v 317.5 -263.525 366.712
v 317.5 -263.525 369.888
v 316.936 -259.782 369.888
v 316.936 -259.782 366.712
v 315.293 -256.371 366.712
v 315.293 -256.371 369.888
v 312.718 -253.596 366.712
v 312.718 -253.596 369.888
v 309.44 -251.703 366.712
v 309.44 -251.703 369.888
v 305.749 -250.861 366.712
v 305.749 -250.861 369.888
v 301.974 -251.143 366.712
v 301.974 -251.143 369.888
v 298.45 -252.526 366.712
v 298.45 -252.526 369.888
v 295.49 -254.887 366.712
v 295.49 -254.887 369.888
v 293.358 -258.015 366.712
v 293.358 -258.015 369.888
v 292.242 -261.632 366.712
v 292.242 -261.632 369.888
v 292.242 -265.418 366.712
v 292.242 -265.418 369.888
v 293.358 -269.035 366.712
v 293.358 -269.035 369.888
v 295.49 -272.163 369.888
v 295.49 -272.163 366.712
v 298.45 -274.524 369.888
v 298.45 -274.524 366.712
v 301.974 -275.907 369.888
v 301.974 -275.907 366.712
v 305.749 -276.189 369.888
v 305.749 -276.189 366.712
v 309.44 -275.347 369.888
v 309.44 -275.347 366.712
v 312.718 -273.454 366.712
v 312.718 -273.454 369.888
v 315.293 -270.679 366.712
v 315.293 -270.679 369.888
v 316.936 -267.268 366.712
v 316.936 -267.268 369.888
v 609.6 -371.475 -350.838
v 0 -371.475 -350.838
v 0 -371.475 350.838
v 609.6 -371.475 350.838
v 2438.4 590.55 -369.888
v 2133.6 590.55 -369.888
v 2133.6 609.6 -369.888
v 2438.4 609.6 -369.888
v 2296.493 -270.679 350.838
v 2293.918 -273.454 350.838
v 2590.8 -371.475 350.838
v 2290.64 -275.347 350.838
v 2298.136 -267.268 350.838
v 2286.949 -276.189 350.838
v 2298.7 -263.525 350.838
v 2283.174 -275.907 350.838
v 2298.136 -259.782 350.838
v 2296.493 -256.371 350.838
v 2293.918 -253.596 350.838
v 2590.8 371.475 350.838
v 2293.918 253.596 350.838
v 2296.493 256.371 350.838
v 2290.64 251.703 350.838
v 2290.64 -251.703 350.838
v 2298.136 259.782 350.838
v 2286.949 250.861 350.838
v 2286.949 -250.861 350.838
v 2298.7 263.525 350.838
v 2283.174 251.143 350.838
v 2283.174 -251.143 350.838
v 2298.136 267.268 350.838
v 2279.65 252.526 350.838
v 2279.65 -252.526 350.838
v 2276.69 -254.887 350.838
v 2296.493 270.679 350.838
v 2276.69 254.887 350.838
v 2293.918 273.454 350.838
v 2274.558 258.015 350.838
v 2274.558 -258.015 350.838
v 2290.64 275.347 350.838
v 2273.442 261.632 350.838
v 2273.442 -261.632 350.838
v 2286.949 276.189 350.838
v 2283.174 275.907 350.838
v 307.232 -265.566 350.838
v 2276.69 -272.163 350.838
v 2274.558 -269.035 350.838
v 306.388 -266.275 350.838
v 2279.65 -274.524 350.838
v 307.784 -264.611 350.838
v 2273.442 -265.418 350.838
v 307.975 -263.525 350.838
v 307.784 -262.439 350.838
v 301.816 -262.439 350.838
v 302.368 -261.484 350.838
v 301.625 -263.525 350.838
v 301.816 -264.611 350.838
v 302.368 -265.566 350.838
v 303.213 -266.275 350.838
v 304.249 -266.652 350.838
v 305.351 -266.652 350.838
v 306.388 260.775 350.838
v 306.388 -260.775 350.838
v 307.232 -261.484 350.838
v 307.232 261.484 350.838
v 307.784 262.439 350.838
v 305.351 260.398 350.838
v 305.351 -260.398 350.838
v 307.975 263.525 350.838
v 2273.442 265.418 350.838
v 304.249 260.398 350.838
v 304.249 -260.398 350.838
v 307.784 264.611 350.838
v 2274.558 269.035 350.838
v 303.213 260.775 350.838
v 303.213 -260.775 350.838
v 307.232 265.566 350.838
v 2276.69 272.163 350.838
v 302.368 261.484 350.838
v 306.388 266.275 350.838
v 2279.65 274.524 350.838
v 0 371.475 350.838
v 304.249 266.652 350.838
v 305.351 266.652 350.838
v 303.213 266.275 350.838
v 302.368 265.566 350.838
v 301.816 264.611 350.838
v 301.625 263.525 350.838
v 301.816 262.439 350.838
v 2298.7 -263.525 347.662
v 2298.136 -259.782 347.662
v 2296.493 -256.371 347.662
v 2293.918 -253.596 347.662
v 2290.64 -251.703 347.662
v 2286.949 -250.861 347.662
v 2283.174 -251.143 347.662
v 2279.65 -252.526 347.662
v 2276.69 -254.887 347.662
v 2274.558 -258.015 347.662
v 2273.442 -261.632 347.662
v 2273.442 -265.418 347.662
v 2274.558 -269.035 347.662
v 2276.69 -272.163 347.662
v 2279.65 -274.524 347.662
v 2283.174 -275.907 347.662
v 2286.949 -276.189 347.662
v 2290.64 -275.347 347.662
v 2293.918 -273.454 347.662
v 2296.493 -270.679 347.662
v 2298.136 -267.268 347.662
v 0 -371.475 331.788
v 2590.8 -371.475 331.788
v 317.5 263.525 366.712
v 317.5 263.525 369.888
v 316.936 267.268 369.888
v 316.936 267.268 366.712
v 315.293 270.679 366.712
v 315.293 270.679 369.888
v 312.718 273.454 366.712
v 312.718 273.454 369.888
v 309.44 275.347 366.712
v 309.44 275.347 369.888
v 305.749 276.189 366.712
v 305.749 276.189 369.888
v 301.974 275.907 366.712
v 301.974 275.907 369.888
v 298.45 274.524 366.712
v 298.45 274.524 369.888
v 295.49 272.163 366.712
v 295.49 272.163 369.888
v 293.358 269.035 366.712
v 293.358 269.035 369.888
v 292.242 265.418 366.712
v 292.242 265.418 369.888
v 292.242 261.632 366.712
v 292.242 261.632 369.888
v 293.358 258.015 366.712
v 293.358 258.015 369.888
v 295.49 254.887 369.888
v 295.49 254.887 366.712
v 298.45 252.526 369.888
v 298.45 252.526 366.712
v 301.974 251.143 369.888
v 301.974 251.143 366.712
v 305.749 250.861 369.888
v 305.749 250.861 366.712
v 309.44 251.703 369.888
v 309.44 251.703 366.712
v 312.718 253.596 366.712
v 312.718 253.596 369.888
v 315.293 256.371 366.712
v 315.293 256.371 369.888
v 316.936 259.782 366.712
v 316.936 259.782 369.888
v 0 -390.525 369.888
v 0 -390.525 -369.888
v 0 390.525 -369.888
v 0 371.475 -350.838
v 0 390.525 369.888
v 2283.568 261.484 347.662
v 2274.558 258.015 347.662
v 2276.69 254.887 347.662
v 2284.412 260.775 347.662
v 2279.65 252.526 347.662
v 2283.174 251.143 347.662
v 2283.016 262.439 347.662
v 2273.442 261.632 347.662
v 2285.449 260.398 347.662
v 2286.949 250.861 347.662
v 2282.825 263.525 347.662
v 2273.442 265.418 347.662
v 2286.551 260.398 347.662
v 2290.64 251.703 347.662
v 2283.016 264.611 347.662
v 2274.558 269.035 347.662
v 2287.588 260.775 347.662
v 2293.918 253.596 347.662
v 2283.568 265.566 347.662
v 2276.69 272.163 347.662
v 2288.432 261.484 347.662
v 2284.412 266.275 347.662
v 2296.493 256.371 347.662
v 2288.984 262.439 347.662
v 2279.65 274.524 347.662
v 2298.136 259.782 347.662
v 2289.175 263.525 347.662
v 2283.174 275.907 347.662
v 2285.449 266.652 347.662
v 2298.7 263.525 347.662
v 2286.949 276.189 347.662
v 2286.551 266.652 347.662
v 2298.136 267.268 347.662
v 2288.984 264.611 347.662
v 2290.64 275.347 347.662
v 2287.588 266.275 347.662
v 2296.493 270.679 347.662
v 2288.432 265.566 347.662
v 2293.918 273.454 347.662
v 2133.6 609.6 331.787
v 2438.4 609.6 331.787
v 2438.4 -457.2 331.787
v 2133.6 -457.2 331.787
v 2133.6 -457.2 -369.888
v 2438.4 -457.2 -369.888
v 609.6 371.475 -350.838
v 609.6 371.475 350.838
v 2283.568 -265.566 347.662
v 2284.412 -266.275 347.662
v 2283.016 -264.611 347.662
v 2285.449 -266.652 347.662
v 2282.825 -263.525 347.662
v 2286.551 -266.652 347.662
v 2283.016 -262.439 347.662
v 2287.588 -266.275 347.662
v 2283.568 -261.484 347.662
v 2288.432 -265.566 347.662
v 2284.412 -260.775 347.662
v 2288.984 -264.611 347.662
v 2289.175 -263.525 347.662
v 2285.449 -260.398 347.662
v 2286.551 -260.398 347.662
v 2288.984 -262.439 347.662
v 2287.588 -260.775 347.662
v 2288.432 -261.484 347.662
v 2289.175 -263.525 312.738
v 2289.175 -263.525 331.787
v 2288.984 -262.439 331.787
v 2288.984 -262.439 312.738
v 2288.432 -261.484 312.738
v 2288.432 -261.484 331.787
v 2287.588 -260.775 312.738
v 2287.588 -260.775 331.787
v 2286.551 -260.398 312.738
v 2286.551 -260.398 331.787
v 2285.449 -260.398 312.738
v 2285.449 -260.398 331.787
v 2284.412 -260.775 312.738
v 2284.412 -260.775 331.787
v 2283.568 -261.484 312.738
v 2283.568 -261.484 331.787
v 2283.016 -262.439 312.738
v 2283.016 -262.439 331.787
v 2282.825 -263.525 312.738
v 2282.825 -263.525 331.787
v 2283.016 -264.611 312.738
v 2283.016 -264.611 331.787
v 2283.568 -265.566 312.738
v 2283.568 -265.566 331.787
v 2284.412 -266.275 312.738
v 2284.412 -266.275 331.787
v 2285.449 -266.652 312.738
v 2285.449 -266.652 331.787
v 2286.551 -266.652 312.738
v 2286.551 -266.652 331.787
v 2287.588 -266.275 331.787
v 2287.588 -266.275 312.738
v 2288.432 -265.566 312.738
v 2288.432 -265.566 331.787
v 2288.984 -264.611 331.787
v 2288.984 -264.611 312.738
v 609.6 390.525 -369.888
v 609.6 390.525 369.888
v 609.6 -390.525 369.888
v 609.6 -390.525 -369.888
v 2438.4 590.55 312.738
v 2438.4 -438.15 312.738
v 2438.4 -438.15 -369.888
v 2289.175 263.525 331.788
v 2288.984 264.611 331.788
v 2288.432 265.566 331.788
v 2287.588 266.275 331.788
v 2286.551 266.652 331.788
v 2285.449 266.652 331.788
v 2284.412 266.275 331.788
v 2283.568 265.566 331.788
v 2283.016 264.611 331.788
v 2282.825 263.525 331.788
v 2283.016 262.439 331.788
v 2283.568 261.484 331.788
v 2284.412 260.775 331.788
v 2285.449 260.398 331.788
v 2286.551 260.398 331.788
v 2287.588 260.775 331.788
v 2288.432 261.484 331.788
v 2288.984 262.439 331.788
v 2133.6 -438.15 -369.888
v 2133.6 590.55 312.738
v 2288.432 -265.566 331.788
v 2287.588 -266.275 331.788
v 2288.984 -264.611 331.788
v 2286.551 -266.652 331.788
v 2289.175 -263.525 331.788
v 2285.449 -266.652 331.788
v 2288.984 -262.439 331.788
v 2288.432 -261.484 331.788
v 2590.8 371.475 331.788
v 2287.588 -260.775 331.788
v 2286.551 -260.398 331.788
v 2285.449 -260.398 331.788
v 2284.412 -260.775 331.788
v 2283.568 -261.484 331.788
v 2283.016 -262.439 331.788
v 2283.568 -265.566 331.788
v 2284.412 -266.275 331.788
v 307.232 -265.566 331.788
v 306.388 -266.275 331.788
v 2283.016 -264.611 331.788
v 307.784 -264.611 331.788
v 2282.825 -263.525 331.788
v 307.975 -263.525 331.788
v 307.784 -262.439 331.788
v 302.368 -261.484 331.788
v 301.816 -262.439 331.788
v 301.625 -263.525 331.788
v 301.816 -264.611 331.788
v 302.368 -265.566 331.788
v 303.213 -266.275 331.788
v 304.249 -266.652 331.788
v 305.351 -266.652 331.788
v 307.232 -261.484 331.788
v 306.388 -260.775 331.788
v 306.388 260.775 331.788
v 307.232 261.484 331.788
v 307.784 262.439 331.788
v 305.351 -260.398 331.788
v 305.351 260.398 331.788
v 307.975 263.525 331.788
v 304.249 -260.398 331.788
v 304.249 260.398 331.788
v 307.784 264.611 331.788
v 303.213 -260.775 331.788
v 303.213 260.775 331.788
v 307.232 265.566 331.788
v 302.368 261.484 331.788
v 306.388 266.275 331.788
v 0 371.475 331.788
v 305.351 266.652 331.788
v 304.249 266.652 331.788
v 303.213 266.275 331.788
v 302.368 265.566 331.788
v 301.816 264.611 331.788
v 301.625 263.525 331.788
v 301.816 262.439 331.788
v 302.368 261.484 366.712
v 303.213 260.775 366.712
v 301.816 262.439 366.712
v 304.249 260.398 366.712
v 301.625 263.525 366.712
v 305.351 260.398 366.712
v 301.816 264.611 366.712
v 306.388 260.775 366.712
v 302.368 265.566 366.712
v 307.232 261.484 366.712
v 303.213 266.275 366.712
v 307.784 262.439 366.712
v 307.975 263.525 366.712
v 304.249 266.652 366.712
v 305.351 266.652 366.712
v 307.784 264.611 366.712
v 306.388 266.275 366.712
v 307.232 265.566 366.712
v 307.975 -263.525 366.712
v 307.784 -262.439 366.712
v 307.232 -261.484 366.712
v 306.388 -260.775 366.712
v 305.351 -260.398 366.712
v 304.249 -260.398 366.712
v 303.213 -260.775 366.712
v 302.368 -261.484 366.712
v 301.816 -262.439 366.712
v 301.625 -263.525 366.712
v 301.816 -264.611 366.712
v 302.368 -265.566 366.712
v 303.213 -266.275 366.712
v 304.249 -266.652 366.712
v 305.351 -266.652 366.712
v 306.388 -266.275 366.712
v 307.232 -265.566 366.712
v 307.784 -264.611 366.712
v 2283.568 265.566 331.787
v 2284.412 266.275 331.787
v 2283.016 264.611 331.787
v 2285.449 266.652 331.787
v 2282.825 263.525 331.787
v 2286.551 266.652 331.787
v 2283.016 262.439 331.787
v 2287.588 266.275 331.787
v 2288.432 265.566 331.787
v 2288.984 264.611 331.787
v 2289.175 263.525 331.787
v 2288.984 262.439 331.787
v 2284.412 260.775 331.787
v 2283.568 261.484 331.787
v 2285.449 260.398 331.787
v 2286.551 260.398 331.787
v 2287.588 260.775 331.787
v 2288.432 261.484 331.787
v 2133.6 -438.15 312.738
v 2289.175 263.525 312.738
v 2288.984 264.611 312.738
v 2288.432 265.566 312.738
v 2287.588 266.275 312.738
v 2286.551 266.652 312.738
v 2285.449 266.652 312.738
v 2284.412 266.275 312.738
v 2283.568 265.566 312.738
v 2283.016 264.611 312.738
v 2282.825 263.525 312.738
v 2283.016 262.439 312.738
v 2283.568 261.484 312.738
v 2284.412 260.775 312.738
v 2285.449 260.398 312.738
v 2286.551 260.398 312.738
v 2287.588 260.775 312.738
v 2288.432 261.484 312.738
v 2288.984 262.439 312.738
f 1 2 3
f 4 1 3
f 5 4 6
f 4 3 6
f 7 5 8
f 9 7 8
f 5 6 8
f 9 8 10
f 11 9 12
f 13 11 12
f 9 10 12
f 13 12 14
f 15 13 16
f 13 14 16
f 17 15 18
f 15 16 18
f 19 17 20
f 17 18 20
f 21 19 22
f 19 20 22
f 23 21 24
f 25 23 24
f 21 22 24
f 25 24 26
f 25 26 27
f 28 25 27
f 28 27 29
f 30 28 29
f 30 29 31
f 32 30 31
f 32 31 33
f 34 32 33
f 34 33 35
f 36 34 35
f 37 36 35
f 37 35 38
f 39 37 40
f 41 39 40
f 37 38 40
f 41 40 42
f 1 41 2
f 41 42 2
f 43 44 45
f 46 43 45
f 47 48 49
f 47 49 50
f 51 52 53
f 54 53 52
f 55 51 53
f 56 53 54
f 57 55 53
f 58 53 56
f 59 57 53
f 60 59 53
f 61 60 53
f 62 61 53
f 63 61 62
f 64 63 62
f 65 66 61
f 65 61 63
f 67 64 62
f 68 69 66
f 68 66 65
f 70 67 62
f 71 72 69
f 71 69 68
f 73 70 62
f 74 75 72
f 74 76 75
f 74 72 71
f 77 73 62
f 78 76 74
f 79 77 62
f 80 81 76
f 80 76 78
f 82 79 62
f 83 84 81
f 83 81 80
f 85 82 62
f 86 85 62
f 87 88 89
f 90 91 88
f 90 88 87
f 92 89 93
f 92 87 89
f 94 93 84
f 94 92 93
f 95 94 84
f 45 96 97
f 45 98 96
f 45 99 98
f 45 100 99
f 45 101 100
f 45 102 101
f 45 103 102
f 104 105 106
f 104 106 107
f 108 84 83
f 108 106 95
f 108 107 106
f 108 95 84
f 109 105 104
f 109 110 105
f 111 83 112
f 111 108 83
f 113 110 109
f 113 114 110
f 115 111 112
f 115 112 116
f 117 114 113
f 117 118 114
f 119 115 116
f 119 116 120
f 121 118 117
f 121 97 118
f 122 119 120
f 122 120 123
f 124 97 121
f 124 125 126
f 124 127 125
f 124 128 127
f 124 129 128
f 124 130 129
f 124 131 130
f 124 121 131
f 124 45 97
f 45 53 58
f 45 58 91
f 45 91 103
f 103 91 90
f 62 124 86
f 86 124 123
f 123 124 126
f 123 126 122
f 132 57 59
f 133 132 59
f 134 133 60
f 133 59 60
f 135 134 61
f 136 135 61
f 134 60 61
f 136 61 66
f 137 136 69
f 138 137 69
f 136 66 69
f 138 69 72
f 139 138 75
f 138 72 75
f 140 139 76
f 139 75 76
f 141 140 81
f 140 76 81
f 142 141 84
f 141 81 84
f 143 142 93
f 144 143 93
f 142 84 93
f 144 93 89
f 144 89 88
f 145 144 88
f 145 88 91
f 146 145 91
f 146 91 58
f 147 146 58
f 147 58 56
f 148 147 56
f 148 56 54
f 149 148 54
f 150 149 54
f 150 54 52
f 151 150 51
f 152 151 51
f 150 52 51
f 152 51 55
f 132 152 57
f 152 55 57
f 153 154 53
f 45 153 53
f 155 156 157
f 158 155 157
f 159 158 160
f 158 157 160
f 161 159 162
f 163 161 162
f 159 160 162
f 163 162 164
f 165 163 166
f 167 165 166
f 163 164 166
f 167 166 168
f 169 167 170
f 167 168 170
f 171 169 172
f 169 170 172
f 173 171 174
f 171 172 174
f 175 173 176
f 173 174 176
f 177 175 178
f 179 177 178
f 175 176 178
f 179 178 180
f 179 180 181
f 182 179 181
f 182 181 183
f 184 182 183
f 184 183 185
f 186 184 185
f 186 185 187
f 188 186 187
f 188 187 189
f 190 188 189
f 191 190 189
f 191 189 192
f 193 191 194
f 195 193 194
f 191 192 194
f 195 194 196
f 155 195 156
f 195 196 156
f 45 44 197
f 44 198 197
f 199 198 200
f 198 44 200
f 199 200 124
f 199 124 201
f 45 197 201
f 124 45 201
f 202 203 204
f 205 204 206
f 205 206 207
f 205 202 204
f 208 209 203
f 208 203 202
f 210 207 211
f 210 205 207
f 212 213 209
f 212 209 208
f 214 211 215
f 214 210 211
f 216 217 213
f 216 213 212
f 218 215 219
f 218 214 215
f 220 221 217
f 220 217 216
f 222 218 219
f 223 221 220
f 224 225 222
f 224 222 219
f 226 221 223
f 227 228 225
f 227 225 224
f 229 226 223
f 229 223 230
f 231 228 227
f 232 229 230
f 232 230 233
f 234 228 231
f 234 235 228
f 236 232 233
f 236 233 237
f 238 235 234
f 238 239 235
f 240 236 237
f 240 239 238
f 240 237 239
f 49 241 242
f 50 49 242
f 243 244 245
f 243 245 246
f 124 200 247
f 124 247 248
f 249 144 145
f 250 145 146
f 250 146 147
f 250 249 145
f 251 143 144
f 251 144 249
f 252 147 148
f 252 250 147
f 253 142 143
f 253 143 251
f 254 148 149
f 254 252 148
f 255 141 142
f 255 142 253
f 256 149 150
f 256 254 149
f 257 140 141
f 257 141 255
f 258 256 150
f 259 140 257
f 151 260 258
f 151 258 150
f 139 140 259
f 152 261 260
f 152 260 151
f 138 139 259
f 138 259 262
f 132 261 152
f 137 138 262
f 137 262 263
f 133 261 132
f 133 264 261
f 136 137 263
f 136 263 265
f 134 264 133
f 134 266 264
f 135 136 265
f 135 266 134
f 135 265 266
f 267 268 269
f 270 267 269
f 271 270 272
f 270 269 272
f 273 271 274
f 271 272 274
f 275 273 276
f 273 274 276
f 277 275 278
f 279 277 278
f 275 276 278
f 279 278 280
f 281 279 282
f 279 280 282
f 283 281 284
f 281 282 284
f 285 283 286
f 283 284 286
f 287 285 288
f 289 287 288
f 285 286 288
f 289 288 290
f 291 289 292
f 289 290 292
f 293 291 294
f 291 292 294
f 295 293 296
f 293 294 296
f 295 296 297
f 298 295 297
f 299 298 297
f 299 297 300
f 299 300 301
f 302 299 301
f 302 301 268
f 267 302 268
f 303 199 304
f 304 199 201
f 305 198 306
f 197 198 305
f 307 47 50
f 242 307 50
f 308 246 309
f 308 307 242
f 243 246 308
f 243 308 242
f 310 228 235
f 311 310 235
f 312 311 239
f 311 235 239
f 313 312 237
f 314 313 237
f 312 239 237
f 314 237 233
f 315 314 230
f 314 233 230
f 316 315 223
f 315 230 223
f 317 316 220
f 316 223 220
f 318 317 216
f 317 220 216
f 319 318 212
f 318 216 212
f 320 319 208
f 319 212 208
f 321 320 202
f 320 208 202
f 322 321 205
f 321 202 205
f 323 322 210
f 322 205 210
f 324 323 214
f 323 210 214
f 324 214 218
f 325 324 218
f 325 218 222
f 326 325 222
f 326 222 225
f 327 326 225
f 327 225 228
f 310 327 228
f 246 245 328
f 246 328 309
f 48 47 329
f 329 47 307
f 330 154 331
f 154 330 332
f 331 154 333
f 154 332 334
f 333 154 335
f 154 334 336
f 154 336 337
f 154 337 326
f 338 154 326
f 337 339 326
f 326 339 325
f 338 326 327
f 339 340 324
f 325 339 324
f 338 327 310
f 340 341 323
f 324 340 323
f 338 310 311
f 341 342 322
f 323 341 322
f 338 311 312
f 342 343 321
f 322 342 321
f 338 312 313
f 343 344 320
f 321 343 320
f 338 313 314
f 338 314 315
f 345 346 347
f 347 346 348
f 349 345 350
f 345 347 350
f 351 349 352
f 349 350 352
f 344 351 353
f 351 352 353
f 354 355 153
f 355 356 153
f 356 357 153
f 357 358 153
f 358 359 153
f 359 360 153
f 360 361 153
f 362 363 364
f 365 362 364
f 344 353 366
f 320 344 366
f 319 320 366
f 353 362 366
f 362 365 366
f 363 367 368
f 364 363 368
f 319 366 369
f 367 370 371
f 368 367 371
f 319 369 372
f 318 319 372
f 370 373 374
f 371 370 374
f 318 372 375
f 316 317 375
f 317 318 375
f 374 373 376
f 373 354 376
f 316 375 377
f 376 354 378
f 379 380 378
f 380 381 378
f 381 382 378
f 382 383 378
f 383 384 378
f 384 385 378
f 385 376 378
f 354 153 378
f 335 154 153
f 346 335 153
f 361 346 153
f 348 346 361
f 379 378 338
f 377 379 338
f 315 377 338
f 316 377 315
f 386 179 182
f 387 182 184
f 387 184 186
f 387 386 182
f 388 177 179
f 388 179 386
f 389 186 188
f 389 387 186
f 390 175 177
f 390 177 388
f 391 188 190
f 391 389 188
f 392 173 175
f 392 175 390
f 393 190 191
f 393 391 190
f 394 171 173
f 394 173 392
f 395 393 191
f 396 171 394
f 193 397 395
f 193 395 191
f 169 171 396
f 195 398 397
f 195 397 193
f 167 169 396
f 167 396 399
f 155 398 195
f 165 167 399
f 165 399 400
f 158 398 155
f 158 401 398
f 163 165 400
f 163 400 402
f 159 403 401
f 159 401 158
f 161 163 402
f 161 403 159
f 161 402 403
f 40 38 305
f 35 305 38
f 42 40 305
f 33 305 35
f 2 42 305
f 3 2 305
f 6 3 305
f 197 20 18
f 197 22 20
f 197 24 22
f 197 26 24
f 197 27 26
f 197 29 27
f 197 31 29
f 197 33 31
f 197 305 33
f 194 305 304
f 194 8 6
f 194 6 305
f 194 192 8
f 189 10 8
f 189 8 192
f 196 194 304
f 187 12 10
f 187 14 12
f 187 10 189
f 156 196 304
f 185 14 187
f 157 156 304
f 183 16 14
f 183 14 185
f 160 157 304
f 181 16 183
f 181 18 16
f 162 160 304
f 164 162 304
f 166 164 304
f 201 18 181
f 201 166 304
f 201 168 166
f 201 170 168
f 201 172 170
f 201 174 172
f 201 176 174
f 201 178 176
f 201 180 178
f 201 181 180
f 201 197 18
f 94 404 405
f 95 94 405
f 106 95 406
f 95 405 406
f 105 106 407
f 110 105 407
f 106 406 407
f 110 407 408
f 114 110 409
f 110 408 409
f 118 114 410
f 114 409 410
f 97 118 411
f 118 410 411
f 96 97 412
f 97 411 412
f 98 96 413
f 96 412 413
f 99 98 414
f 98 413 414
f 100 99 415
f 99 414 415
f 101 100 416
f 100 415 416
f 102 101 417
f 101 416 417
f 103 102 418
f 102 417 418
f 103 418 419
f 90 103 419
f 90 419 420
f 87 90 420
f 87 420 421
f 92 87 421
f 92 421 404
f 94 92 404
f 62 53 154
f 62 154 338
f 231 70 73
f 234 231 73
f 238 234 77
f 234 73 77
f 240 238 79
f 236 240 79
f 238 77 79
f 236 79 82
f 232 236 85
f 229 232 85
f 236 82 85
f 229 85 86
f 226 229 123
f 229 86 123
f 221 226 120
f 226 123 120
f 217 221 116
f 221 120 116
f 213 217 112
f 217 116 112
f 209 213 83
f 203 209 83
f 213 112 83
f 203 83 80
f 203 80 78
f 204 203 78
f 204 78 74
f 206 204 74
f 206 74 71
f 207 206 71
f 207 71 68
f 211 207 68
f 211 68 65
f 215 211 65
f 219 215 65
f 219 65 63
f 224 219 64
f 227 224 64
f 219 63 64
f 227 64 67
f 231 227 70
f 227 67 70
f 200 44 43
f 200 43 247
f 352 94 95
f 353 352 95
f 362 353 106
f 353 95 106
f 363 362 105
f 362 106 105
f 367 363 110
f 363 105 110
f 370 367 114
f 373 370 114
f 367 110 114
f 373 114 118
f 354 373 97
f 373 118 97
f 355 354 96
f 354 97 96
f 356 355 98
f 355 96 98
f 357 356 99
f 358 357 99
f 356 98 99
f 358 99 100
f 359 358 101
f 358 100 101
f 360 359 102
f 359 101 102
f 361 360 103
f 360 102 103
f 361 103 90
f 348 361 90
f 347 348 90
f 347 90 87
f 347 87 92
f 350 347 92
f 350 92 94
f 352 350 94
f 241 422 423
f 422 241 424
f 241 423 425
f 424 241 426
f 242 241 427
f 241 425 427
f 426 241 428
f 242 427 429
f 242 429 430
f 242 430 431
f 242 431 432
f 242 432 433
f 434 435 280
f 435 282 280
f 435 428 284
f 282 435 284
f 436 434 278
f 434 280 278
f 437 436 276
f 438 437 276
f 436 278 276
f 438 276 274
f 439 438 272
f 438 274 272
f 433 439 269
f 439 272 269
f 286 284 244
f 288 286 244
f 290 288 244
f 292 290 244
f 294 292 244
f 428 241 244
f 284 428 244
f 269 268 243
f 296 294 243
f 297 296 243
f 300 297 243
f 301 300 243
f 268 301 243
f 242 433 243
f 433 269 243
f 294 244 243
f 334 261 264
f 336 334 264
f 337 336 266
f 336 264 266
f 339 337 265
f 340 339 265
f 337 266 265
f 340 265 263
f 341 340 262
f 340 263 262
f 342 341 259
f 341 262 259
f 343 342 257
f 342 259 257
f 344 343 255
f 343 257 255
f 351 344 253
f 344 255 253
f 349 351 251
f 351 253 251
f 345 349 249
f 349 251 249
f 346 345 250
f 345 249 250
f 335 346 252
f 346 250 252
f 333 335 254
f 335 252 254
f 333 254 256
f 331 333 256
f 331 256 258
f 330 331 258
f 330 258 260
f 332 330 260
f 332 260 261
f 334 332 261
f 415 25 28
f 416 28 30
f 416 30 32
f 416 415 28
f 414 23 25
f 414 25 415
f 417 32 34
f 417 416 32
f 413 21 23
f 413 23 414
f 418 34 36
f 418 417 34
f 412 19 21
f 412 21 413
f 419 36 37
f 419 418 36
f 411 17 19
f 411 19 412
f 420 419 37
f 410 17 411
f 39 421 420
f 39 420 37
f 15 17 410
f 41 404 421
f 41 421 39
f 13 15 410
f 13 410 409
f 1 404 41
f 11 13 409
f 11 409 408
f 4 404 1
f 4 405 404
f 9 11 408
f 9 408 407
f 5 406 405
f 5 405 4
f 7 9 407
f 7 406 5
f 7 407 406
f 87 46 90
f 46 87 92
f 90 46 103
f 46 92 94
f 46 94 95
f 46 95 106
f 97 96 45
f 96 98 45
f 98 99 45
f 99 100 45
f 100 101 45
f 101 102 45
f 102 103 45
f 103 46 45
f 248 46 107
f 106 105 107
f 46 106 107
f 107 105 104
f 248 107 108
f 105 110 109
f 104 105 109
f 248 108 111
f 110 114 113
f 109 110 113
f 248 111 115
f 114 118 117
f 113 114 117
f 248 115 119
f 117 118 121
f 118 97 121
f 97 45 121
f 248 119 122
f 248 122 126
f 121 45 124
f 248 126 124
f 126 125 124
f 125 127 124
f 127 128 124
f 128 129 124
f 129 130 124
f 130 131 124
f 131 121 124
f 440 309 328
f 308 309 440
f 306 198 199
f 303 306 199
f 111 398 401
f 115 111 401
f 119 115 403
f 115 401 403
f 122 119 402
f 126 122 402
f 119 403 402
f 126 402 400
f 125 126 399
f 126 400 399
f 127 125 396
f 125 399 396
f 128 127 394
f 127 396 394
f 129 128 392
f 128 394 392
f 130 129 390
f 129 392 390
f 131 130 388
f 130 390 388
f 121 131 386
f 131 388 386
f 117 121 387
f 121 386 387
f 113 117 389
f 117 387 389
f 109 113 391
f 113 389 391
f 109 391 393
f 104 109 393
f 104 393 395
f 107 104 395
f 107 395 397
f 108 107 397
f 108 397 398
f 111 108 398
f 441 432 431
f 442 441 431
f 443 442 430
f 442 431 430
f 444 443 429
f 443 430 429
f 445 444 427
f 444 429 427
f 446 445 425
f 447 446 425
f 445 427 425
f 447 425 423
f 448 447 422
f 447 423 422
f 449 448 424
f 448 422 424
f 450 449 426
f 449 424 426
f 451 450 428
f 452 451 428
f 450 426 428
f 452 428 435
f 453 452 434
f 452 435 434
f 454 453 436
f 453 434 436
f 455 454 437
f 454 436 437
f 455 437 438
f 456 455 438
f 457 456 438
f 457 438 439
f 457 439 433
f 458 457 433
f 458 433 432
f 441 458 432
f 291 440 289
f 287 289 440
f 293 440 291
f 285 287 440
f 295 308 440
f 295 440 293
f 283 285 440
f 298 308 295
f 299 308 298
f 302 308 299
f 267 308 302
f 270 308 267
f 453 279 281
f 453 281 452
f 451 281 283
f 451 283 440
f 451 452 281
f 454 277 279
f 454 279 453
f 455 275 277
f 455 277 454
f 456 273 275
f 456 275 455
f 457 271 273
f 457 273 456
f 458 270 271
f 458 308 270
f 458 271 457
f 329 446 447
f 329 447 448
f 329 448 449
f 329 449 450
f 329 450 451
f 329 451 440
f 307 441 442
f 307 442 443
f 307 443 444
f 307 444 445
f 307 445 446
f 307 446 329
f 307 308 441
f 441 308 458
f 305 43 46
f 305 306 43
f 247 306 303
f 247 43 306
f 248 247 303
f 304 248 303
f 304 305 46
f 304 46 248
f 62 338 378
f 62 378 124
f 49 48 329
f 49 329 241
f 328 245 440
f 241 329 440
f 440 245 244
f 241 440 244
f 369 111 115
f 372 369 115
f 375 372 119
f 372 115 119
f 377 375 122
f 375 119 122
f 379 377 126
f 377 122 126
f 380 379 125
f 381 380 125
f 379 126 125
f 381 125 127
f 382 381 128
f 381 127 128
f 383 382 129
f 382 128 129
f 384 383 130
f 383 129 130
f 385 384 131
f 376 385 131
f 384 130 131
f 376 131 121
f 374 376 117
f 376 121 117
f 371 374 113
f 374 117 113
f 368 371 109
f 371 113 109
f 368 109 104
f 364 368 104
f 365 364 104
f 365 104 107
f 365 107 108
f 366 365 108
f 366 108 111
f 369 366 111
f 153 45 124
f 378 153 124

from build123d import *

# Parameters (mm, degrees)
F0_W          = 781.05
F0_H          = 739.775
F0_W_2        = 742.95
F0_H_2        = 701.675
F1_DEPTH      = 609.6
F2_W          = 742.95
F2_H          = 19.05
F3_DEPTH      = 2590.8
F4_W          = 304.8
F4_H          = 701.675
F5_DEPTH      = 457.2
F5_DEPTH_BACK = 609.6
F6_W          = 1028.7
F6_H          = 682.625
F7_DEPTH      = 2438.401
F8_R          = 12.7
F9_DEPTH      = 3.175
F10_R         = 12.7
F11_DEPTH     = 3.175
F12_R         = 3.175
F13_DEPTH     = 717.551
F14_R         = 3.175
F15_DEPTH     = 717.551
F16_R         = 3.175
F17_DEPTH     = 127
F19_R         = 3.175
F20_DEPTH     = 317.5


with BuildPart() as f1:
    # F0 (on Right) → F1 (new body)
    with BuildSketch(Plane.YZ):
        Rectangle(F0_W, F0_H)
        Rectangle(F0_W_2, F0_H_2, mode=Mode.SUBTRACT)
    extrude(amount=F1_DEPTH)

    # F8 (on face) → F9 (cut)
    with BuildSketch(Plane.XY.offset(369.8875)):
        with Locations((304.8, 263.525)):
            Circle(F8_R)
        with Locations((304.8, -263.525)):
            Circle(F8_R)
    extrude(amount=-F9_DEPTH, mode=Mode.SUBTRACT)


with BuildPart() as f3:
    # F2 (on Right) → F3 (new body)
    with BuildSketch(Plane.YZ):
        with Locations((0, 341.3125)):
            Rectangle(F2_W, F2_H)
    extrude(amount=F3_DEPTH)

    # F10 (on face) → F11 (cut)
    with BuildSketch(Plane.XY.offset(350.8375)):
        with Locations((2286, -263.525)):
            Circle(F10_R)
        with Locations((2286, 263.525)):
            Circle(F10_R)
    extrude(amount=-F11_DEPTH, mode=Mode.SUBTRACT)


with BuildPart() as f5:
    # F4 (on Front) → F5 (new body, two sides)
    with BuildSketch(Plane.XZ) as f5_sk:
        with Locations((2286, -19.05)):
            Rectangle(F4_W, F4_H)
    extrude(amount=F5_DEPTH)
    extrude(f5_sk.sketch, amount=-F5_DEPTH_BACK)

    # F6 (on face) → F7 (cut, through all)
    with BuildSketch(Plane.YZ.offset(2438.4)):
        with Locations((76.2, -28.575)):
            Rectangle(F6_W, F6_H)
    extrude(amount=-F7_DEPTH, mode=Mode.SUBTRACT)


with BuildPart() as f13_tool:
    # F12 (on face) → F13 (new body, through all)
    with BuildSketch(Plane.XY.offset(347.6625)):
        with Locations((2286, 263.525)):
            Circle(F12_R)
    extrude(amount=-F13_DEPTH)


with BuildPart() as f3_1:
    add(f3.part)

    # F13: cut by f13_tool
    add(f13_tool.part, mode=Mode.SUBTRACT)


with BuildPart() as f5_1:
    add(f5.part)

    # F13: cut by f13_tool
    add(f13_tool.part, mode=Mode.SUBTRACT)


with BuildPart() as f15_tool:
    # F14 (on face) → F15 (new body, through all)
    with BuildSketch(Plane.XY.offset(347.6625)):
        with Locations((2286, -263.525)):
            Circle(F14_R)
    extrude(amount=-F15_DEPTH)


with BuildPart() as f3_2:
    add(f3_1.part)

    # F15: cut by f15_tool
    add(f15_tool.part, mode=Mode.SUBTRACT)


with BuildPart() as f5_2:
    add(f5_1.part)

    # F15: cut by f15_tool
    add(f15_tool.part, mode=Mode.SUBTRACT)


with BuildPart() as f17_tool:
    # F16 (on face) → F17 (new body)
    with BuildSketch(Plane.XY.offset(366.7125)):
        with Locations((304.8, 263.525)):
            Circle(F16_R)
    extrude(amount=-F17_DEPTH)


with BuildPart() as f1_1:
    add(f1.part)

    # F17: cut by f17_tool
    add(f17_tool.part, mode=Mode.SUBTRACT)


with BuildPart() as f3_3:
    add(f3_2.part)

    # F17: cut by f17_tool
    add(f17_tool.part, mode=Mode.SUBTRACT)


with BuildPart() as f20_tool:
    # F19 (on face) → F20 (new body)
    with BuildSketch(Plane.XY.offset(366.7125)):
        with Locations((304.8, -263.525)):
            Circle(F19_R)
    extrude(amount=-F20_DEPTH)


with BuildPart() as f1_2:
    add(f1_1.part)

    # F20: cut by f20_tool
    add(f20_tool.part, mode=Mode.SUBTRACT)


with BuildPart() as f3_4:
    add(f3_3.part)

    # F20: cut by f20_tool
    add(f20_tool.part, mode=Mode.SUBTRACT)


solid = Compound([f5_2.part, f1_2.part, f3_4.part])
